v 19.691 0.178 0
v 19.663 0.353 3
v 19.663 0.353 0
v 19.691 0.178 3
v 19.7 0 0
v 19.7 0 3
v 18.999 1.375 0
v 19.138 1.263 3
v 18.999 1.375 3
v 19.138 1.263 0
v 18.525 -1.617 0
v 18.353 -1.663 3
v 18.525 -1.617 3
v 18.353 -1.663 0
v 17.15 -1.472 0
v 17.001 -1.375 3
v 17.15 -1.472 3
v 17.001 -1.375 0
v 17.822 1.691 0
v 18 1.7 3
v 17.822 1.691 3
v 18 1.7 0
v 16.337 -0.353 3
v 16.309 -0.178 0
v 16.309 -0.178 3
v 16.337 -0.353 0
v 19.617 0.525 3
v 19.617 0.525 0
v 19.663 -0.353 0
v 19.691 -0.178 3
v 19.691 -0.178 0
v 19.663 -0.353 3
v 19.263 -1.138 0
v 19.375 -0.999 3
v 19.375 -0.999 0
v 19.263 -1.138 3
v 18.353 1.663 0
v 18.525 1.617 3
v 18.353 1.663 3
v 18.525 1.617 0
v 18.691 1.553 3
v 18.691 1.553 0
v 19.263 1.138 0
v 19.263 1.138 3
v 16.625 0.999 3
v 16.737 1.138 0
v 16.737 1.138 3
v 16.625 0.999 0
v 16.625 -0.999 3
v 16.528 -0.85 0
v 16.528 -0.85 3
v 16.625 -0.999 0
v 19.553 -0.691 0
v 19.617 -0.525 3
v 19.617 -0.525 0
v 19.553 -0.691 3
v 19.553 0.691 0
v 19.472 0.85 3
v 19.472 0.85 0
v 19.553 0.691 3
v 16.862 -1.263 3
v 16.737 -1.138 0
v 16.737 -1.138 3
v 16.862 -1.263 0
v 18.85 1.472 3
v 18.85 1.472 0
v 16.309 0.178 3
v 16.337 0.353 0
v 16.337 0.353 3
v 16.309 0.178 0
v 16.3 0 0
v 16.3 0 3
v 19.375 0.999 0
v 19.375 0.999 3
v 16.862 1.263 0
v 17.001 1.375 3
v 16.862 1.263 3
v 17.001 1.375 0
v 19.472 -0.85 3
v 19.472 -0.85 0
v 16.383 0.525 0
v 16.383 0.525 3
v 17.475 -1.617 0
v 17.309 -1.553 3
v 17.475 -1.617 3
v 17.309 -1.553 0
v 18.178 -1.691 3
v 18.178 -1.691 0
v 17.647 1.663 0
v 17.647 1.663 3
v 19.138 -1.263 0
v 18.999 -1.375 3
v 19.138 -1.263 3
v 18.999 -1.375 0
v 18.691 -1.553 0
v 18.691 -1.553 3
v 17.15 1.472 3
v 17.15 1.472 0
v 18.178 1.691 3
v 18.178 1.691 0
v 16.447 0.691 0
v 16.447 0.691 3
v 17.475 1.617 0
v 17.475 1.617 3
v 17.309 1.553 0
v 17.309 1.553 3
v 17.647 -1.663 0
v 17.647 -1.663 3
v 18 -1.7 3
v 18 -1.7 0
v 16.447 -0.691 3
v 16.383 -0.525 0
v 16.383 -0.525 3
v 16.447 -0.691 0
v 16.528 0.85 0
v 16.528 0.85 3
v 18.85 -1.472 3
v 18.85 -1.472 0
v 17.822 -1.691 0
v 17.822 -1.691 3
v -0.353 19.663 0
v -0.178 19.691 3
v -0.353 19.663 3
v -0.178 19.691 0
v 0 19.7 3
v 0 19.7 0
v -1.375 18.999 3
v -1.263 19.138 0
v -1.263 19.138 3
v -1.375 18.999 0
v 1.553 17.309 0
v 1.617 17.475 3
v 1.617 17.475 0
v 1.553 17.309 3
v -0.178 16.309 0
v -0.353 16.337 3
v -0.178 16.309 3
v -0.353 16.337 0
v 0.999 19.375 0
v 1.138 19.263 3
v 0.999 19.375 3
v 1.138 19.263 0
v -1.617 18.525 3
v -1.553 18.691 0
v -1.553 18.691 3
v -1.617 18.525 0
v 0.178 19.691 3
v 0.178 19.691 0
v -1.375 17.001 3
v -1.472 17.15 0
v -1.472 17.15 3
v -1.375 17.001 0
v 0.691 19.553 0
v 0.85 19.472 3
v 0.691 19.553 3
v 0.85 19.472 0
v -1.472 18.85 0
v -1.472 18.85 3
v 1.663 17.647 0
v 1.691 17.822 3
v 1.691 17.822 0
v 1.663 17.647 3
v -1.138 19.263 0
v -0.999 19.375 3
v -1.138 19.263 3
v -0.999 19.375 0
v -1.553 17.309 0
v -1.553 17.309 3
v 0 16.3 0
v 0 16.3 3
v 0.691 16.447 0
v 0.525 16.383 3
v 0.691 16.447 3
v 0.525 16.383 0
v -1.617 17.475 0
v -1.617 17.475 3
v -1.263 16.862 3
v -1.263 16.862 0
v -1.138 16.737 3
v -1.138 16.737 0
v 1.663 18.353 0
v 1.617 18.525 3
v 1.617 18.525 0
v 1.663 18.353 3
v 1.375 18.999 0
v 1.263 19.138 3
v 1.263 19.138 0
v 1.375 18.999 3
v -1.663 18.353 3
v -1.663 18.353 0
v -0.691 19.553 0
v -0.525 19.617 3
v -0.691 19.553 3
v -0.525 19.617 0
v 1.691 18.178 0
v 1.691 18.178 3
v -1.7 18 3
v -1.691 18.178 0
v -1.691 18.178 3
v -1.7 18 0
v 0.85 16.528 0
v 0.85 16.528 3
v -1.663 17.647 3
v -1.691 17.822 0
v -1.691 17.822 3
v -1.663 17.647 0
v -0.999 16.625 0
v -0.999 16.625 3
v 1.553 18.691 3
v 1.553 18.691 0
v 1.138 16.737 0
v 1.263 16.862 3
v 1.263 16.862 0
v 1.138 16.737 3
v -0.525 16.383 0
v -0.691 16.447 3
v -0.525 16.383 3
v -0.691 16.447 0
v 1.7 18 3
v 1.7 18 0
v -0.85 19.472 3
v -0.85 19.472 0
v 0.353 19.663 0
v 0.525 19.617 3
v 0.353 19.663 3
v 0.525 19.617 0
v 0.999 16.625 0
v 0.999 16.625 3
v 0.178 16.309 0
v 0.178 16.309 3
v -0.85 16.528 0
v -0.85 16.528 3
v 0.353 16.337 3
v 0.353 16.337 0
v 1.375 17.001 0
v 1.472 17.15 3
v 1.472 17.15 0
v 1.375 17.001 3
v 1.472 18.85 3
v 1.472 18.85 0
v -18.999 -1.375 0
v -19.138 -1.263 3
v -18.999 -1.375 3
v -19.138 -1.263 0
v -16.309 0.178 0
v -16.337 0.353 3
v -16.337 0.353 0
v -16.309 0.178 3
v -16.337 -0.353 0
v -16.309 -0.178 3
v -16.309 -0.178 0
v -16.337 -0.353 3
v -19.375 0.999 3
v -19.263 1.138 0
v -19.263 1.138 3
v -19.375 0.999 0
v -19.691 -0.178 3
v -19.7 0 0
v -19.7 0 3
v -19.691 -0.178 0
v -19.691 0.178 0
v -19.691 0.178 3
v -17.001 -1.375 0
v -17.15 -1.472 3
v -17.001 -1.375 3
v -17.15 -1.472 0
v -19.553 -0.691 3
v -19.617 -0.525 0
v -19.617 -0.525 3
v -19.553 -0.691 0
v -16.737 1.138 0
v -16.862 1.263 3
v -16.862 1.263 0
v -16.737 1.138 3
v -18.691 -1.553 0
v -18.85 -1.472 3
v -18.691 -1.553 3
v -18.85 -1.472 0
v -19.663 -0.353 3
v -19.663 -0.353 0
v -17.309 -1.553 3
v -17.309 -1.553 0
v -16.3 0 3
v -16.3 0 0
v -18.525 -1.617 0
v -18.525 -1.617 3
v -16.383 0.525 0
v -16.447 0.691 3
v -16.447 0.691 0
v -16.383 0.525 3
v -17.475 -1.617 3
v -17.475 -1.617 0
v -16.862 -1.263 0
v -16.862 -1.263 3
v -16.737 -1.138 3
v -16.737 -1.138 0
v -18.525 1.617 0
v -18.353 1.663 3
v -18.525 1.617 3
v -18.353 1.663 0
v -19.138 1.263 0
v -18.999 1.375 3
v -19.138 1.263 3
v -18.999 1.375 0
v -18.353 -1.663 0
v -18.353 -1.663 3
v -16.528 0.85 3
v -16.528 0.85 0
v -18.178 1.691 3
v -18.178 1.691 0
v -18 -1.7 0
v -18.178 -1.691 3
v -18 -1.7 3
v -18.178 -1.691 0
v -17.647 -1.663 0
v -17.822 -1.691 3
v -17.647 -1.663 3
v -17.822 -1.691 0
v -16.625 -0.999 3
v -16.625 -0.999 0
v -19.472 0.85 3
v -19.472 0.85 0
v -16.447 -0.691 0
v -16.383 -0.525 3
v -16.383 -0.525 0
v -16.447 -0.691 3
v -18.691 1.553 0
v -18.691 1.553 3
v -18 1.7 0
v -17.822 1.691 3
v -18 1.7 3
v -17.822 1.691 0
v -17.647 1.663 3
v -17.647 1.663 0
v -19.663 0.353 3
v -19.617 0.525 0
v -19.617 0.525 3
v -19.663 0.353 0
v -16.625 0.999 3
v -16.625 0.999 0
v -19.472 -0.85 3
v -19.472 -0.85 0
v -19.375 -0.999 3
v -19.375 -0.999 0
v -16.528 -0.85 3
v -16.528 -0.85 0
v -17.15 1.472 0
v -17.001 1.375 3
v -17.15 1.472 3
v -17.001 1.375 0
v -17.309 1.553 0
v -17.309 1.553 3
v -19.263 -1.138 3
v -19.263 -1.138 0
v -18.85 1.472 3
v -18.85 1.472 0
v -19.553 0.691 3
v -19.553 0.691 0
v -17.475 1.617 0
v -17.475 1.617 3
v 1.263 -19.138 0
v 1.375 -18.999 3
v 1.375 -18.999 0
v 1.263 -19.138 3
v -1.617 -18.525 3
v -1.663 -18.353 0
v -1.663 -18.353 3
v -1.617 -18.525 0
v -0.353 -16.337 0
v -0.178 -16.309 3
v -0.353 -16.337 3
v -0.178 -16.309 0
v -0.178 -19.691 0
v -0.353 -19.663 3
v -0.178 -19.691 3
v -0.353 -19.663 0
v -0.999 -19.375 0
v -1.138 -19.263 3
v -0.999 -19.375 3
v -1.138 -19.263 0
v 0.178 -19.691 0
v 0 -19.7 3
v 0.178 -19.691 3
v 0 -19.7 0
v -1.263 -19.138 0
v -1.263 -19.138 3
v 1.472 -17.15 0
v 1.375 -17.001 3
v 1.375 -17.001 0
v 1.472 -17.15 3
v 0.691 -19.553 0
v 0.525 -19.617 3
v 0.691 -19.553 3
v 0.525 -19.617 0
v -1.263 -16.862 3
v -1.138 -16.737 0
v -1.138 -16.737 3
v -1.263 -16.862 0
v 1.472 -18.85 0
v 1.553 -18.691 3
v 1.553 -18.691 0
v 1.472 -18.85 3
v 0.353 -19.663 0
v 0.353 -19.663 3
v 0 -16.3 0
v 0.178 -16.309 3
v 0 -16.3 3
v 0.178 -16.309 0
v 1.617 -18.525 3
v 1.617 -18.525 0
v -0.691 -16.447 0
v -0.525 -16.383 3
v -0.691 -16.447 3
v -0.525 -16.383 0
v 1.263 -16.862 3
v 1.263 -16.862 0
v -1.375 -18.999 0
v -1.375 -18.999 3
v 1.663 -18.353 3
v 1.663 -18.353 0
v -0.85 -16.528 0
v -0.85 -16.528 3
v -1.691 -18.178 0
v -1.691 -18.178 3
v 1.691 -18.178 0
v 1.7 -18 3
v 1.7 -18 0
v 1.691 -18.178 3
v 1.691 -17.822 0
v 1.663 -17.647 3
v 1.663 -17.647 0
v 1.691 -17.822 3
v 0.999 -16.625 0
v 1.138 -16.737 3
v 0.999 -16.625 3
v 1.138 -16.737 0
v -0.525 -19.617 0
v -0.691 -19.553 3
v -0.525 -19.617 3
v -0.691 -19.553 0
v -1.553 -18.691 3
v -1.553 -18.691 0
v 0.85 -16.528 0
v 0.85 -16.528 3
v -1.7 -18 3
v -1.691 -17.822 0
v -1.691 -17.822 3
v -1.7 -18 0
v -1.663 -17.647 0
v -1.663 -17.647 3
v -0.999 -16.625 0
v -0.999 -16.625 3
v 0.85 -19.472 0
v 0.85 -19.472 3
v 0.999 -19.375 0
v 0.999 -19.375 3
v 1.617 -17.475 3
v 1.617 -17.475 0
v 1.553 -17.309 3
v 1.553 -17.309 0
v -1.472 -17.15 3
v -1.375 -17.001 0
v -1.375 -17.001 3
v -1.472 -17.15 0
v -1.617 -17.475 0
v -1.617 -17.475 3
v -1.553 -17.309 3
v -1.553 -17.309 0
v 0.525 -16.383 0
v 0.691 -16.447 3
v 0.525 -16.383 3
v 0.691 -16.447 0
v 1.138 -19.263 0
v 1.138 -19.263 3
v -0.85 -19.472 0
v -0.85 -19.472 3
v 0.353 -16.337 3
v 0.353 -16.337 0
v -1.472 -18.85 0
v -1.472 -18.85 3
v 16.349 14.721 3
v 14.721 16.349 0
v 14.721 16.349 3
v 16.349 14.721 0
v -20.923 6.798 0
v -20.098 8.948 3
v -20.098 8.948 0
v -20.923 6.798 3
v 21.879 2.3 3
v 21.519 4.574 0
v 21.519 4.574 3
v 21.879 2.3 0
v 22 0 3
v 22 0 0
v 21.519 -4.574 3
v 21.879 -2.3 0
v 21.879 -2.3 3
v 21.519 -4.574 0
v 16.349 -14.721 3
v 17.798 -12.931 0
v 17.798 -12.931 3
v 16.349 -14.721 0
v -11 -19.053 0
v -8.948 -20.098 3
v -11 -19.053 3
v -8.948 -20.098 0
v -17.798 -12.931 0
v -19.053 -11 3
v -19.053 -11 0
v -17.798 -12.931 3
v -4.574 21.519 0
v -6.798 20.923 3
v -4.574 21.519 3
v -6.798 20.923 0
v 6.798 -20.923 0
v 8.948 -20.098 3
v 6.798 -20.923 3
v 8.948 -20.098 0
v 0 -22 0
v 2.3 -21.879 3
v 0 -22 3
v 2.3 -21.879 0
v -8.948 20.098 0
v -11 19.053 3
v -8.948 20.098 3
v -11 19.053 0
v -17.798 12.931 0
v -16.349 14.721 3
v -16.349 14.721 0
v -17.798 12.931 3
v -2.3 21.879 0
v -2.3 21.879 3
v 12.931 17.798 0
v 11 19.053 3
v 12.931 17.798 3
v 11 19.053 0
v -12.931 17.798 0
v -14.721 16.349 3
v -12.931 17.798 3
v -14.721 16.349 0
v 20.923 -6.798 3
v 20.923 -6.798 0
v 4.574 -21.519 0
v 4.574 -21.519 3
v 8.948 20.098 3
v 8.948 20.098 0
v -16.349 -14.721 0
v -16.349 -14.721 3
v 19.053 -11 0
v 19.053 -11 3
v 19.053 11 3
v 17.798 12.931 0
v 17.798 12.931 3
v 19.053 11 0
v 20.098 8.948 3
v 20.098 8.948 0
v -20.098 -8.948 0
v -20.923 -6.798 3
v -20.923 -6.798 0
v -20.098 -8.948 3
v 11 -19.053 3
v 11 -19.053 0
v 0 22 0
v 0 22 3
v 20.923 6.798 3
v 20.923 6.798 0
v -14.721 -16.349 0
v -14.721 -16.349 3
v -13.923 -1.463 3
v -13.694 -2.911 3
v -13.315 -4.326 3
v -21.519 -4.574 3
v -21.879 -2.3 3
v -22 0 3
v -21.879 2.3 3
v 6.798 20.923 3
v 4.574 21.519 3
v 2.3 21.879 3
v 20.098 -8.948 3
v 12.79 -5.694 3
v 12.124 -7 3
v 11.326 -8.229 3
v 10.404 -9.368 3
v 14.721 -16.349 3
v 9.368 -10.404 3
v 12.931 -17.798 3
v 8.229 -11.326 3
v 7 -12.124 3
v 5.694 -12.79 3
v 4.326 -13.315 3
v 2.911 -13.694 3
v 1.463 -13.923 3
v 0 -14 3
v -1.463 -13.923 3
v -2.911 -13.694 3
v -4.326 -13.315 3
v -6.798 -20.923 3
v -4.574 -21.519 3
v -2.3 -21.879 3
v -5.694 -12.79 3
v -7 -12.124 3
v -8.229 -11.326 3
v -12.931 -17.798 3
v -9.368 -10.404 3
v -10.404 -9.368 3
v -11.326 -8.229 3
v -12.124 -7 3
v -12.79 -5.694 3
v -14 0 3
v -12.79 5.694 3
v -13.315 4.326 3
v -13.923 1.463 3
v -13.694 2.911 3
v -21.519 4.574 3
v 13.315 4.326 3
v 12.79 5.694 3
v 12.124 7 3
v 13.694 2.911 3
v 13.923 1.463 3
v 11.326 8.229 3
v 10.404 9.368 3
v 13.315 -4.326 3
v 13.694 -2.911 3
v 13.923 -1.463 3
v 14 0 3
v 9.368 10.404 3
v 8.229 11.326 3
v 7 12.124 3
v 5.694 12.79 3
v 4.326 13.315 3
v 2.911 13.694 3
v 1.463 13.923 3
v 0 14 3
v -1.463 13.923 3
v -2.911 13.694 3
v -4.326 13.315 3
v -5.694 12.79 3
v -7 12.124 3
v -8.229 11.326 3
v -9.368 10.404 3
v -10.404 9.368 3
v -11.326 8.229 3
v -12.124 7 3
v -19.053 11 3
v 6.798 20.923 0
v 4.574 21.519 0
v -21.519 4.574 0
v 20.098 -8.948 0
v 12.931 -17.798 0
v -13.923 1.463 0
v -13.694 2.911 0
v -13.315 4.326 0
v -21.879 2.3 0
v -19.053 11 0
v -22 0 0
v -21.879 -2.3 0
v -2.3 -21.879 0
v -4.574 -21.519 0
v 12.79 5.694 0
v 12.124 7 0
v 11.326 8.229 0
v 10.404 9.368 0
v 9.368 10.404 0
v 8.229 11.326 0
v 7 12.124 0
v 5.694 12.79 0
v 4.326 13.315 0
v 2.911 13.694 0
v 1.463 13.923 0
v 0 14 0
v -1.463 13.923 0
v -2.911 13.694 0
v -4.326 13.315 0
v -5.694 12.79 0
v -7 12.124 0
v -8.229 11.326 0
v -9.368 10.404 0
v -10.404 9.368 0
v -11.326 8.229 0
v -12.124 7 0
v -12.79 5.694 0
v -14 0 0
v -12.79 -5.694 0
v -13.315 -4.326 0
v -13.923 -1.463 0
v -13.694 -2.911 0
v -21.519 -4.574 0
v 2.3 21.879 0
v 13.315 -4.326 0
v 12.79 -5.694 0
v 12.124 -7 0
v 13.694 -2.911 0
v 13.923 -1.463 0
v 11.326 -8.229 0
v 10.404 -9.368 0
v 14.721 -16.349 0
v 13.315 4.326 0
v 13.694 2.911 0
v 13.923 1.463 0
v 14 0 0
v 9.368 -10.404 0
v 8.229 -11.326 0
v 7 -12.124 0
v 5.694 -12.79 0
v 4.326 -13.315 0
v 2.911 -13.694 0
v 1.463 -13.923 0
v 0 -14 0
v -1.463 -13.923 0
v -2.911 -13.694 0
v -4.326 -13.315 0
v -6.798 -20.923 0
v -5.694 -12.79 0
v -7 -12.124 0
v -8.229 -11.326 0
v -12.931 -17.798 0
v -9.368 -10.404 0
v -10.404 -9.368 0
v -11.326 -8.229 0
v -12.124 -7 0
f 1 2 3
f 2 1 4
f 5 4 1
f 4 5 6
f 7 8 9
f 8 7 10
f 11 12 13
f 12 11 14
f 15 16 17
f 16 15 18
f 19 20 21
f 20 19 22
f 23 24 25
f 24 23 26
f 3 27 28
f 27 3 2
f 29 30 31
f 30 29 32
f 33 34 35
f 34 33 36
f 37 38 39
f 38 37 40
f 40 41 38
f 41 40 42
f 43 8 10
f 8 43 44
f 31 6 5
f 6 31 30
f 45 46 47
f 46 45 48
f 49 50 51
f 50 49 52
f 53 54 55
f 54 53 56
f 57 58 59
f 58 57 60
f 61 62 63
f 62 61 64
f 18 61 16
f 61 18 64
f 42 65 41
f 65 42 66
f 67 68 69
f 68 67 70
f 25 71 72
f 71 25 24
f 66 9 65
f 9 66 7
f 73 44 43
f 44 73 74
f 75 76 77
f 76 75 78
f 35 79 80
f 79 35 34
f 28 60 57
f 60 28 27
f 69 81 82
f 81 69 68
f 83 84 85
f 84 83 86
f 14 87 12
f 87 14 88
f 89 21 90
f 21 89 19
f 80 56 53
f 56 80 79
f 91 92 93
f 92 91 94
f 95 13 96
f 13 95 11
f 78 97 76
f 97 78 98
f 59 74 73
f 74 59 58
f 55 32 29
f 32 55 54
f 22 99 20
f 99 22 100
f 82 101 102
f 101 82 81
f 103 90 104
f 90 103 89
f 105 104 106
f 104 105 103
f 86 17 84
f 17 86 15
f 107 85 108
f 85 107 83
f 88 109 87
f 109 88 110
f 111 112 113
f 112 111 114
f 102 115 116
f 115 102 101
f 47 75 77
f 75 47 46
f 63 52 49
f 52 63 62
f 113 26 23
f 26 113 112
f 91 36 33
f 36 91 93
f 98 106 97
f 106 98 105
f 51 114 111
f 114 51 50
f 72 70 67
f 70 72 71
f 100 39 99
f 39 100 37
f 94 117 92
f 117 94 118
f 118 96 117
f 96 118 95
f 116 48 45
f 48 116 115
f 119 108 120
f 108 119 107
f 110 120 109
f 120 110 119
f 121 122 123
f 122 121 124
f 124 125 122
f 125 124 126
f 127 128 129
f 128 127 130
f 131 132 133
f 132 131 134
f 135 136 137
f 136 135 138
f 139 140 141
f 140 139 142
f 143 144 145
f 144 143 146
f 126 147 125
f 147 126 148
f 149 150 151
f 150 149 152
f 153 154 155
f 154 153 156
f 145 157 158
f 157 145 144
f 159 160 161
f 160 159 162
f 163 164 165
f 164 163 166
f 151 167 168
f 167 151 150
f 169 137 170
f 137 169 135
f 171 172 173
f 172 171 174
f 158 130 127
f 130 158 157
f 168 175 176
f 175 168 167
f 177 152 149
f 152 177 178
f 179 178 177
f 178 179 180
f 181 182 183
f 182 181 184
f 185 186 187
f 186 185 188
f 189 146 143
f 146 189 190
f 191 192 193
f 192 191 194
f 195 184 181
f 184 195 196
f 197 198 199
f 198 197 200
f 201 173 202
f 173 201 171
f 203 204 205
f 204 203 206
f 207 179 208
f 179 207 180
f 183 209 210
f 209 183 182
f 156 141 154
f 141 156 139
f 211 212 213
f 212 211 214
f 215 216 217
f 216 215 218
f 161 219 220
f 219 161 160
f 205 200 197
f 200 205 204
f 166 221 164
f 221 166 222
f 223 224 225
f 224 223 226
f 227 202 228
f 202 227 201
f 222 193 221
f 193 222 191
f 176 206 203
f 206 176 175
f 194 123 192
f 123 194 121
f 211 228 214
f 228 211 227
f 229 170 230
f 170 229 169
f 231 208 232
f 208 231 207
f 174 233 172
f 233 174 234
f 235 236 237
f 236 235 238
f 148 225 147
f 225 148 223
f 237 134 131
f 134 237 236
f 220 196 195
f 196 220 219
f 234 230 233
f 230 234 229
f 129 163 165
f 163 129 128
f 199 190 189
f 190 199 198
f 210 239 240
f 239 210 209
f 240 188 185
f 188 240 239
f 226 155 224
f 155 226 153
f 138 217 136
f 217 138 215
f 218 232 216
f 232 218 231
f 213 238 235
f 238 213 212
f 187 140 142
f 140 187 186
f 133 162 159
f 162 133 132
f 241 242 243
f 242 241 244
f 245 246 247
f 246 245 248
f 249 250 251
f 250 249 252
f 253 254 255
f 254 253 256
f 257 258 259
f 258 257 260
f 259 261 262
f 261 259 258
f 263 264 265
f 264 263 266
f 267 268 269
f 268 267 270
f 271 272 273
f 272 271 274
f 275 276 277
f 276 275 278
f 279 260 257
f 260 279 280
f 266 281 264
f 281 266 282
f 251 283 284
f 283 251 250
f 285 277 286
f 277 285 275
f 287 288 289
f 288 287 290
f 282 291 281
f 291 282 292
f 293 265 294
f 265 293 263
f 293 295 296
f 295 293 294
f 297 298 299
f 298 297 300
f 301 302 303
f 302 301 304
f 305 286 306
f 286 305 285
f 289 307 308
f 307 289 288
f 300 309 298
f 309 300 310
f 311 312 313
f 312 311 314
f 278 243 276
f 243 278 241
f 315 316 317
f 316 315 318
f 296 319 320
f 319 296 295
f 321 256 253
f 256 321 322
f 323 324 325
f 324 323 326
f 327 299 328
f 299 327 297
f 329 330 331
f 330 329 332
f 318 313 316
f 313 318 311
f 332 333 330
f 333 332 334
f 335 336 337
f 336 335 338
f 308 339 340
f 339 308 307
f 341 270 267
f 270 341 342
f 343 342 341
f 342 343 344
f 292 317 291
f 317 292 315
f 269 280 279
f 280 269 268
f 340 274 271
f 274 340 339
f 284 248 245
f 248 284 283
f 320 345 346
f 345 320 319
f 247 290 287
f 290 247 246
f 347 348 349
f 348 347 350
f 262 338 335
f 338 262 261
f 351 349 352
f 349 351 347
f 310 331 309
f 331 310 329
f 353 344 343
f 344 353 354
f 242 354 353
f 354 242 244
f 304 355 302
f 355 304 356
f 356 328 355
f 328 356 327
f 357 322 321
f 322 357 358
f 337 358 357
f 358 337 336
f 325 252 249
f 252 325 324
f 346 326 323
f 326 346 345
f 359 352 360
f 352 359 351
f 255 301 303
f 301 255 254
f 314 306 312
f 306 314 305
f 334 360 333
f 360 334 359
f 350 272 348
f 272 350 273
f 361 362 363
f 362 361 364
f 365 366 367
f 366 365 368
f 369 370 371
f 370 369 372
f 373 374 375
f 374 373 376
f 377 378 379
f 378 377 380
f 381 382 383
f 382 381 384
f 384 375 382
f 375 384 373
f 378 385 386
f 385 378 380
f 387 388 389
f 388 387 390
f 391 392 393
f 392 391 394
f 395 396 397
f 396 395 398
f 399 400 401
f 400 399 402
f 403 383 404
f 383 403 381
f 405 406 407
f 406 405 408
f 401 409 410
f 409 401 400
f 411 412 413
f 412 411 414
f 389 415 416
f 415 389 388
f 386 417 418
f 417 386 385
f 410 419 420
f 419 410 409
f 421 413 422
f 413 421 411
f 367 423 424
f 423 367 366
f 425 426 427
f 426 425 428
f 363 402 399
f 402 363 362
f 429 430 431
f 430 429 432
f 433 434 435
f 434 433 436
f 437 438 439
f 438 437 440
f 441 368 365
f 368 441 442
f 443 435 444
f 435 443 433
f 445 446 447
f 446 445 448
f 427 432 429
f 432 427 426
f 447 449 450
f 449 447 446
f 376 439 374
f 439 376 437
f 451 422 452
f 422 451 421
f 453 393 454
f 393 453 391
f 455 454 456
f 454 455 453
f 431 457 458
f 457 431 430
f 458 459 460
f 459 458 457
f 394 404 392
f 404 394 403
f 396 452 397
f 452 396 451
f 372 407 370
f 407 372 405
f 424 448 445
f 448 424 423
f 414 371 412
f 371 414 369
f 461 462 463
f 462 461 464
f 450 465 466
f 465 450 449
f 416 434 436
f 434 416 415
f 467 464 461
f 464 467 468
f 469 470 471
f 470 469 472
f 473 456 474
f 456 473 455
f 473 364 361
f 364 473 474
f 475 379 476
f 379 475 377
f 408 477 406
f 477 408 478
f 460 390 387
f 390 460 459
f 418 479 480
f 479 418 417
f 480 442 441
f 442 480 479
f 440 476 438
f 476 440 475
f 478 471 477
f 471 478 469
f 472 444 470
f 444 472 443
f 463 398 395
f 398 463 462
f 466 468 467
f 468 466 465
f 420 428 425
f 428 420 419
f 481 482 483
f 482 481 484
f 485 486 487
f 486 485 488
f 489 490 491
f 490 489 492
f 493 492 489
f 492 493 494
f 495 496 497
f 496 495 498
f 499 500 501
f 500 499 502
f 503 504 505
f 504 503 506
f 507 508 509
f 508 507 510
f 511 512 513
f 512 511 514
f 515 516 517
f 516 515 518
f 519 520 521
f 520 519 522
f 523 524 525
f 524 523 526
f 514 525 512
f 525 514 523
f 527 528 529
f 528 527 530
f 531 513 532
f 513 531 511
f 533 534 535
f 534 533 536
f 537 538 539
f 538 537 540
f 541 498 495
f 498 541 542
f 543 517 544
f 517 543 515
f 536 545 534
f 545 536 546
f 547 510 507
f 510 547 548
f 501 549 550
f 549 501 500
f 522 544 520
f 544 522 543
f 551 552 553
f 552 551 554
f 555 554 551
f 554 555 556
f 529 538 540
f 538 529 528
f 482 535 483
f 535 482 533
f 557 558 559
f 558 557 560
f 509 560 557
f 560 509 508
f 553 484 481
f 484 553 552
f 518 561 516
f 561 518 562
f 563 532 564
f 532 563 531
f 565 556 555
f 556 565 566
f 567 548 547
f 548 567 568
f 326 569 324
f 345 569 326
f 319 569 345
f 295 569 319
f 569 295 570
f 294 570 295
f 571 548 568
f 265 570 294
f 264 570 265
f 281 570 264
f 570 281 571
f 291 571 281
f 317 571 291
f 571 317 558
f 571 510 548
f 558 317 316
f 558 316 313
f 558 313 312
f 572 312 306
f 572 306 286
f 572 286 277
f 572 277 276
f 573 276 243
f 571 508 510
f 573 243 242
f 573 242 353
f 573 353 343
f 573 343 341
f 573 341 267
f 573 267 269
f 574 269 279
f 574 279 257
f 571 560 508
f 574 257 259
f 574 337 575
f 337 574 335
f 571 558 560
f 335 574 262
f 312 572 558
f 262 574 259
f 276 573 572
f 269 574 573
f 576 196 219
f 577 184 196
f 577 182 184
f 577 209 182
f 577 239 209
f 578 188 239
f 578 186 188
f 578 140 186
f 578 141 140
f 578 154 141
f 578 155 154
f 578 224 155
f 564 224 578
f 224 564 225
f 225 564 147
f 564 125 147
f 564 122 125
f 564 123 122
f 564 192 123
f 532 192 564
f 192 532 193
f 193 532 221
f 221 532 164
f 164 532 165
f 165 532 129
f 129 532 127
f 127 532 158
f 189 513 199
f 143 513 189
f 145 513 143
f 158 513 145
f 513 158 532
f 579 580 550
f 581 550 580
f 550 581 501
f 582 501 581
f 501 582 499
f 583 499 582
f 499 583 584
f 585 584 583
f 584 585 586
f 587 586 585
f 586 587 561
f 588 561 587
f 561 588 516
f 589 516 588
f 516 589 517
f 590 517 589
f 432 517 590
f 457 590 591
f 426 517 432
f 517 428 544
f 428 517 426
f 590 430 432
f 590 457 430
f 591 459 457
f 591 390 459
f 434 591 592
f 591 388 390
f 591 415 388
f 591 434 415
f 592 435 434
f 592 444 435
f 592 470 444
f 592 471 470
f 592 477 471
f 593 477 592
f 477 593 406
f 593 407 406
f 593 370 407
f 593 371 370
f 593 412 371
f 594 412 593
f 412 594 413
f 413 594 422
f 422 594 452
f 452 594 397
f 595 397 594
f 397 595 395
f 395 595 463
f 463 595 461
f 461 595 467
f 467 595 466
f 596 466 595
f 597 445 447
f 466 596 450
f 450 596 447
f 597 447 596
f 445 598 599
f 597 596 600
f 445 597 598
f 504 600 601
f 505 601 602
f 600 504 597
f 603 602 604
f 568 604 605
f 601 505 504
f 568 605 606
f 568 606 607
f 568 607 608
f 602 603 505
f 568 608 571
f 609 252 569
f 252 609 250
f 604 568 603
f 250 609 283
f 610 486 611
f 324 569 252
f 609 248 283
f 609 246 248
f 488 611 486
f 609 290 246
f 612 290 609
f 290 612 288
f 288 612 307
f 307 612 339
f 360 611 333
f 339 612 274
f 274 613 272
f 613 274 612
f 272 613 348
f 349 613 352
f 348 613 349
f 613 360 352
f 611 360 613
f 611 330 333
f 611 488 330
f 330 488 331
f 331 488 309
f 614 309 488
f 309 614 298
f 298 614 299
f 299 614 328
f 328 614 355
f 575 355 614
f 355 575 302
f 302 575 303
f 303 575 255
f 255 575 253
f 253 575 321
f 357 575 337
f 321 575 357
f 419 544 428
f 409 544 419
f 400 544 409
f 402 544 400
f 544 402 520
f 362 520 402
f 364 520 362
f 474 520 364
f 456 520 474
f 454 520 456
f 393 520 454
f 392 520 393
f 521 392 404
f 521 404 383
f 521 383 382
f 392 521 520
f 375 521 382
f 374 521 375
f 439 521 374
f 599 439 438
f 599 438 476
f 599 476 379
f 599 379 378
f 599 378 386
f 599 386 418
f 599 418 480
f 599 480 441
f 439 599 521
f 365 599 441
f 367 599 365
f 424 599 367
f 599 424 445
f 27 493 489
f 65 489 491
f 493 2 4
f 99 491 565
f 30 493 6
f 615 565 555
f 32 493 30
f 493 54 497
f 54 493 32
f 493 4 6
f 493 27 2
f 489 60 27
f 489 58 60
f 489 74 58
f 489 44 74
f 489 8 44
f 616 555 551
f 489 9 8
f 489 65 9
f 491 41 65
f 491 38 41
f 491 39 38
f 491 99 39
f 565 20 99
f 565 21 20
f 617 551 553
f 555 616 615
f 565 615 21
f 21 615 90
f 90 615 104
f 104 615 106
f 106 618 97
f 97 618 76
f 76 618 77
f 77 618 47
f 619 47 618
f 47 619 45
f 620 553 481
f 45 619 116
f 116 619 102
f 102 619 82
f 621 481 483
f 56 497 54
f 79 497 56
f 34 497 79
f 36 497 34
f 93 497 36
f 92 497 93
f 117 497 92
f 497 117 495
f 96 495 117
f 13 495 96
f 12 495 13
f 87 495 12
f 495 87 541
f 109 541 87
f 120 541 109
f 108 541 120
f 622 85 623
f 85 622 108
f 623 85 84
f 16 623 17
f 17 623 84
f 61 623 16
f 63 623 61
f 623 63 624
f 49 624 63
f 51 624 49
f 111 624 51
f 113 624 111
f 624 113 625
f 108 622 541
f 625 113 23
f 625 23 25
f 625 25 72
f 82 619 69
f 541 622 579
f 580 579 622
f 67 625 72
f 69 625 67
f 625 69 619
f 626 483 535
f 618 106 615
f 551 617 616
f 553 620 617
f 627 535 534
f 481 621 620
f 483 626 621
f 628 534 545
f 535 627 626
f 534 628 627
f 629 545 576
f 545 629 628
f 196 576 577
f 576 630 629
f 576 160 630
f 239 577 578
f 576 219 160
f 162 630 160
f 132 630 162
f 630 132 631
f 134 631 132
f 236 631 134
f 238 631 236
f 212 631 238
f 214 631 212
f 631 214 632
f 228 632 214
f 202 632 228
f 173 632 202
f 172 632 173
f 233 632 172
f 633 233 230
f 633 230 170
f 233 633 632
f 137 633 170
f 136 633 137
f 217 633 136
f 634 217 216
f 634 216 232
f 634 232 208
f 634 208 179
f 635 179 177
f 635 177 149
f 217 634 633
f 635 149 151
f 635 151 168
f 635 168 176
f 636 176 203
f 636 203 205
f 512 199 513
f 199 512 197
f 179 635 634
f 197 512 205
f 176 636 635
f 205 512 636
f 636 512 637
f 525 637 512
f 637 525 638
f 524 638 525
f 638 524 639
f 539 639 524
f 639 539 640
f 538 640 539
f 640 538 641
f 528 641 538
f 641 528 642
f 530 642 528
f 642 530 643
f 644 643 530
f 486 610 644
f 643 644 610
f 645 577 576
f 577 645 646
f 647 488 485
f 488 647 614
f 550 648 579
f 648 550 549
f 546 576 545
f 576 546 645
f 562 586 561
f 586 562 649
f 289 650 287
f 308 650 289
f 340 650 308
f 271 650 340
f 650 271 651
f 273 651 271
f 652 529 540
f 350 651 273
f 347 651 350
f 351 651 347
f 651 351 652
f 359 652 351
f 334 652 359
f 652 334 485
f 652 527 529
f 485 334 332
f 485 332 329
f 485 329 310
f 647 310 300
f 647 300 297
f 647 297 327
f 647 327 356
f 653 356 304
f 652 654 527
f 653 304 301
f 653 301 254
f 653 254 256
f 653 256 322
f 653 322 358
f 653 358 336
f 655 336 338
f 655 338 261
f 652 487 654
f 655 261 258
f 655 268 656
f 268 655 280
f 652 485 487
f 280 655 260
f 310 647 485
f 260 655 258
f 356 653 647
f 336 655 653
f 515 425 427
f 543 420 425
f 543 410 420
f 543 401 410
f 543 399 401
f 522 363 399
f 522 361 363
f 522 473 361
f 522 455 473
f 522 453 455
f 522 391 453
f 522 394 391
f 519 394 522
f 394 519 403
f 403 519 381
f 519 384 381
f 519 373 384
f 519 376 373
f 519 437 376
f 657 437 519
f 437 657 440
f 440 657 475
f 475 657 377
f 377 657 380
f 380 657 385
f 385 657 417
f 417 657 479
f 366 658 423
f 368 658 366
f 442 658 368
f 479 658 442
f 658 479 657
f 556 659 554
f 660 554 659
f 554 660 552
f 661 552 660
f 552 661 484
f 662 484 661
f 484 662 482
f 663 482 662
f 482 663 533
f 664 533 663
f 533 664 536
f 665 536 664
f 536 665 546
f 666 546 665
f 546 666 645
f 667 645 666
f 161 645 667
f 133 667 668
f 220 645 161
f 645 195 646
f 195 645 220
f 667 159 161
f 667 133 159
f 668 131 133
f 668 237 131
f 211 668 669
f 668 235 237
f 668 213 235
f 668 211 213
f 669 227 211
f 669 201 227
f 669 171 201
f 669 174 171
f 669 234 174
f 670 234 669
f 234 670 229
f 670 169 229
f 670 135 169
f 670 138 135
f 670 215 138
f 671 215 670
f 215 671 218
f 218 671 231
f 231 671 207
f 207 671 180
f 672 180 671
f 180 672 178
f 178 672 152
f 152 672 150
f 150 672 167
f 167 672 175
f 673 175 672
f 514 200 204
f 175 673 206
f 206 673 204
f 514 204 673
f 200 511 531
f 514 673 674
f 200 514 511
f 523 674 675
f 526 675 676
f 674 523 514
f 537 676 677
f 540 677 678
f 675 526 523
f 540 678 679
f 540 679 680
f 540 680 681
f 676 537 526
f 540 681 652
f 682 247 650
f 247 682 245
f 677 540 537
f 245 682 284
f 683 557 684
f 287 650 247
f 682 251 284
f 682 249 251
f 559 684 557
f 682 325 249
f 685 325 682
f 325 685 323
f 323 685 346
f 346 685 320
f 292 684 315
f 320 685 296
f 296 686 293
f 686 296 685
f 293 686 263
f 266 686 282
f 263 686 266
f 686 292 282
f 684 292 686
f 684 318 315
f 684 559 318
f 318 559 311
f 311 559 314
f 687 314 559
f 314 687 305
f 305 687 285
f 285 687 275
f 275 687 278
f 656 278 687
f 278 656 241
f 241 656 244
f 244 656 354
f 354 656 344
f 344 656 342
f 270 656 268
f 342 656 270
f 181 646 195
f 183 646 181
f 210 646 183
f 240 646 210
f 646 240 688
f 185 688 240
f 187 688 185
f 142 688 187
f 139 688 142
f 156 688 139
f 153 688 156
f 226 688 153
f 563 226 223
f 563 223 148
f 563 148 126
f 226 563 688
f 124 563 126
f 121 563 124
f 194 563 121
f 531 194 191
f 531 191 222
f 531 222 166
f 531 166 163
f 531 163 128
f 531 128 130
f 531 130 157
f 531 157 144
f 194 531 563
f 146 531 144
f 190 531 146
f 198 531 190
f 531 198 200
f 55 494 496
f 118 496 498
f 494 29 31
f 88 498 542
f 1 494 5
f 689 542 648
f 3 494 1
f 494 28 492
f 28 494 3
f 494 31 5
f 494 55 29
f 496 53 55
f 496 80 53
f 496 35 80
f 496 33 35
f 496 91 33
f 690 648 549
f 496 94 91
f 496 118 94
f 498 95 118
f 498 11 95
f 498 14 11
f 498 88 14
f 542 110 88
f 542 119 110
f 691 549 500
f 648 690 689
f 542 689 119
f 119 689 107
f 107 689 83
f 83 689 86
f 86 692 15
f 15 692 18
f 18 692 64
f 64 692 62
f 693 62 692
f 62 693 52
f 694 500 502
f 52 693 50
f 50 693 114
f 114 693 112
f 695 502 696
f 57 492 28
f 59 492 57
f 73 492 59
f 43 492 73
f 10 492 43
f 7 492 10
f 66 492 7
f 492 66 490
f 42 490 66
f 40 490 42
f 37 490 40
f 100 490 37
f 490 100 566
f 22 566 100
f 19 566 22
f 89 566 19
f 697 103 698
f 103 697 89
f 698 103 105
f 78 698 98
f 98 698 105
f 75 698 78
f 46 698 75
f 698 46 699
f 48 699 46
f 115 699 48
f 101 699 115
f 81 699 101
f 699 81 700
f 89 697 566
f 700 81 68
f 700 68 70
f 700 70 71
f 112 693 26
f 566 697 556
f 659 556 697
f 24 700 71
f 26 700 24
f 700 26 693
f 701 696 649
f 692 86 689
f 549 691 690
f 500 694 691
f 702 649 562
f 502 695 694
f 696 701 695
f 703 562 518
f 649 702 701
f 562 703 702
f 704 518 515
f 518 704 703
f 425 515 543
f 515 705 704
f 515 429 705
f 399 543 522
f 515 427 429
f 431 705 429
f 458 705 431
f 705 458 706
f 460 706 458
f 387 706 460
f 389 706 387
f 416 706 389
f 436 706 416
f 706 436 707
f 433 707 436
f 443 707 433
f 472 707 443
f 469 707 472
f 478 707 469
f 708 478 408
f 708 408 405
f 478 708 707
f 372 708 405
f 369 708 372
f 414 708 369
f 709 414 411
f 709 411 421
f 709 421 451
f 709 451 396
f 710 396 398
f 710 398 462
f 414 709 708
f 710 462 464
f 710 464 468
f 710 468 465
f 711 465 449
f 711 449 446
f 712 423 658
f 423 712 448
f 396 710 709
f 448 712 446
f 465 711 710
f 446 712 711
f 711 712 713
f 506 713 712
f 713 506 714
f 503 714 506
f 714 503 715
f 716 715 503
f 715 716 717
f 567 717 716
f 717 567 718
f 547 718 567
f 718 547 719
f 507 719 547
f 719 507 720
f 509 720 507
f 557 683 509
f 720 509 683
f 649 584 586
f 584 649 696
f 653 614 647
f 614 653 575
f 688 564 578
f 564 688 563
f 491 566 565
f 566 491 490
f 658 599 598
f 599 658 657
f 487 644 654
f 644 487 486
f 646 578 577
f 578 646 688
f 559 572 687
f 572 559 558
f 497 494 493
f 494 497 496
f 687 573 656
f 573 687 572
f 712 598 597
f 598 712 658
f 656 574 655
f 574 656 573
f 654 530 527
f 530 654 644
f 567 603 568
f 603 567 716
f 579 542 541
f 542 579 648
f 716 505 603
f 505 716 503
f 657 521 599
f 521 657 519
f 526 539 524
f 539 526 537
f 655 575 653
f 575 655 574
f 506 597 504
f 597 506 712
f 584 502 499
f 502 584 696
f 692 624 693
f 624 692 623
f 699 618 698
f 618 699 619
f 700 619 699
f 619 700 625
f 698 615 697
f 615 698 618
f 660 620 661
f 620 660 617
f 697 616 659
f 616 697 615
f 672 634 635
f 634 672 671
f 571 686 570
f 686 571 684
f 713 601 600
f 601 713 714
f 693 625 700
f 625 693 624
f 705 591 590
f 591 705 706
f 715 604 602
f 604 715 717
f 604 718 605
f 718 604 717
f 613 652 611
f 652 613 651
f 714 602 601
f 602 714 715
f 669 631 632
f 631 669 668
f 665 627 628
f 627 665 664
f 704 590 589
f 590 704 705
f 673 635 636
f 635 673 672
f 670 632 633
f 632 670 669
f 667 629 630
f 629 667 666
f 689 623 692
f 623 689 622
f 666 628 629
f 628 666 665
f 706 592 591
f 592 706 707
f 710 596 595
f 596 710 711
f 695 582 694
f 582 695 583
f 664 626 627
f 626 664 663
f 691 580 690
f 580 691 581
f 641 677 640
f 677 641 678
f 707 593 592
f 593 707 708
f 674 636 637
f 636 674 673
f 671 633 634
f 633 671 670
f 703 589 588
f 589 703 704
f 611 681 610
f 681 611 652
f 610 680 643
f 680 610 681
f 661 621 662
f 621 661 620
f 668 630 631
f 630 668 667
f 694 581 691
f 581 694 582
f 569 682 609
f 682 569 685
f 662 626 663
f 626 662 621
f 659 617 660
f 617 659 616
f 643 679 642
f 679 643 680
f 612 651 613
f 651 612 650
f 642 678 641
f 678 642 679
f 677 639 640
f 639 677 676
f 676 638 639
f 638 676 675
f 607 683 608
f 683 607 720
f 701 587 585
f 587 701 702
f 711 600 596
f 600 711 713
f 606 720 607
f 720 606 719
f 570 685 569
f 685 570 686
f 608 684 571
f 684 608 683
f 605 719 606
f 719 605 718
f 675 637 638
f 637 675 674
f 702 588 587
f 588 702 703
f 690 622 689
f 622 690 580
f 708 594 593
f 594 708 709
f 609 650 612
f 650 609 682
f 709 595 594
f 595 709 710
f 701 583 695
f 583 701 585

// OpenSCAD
// Bearing retaining ring.
$fn = 60;
eps = 0.02;
bearing_d = 28;
outer_d = 44;
thickness = 3;
difference() {
    cylinder(d=outer_d,h=thickness);
    translate([0,0,-eps]) cylinder(d=bearing_d,h=thickness+2*eps);
    for (i=[0:3]) rotate([0,0,i*90]) translate([outer_d/2-4,0,-eps]) cylinder(d=3.4,h=thickness+2*eps);
}
